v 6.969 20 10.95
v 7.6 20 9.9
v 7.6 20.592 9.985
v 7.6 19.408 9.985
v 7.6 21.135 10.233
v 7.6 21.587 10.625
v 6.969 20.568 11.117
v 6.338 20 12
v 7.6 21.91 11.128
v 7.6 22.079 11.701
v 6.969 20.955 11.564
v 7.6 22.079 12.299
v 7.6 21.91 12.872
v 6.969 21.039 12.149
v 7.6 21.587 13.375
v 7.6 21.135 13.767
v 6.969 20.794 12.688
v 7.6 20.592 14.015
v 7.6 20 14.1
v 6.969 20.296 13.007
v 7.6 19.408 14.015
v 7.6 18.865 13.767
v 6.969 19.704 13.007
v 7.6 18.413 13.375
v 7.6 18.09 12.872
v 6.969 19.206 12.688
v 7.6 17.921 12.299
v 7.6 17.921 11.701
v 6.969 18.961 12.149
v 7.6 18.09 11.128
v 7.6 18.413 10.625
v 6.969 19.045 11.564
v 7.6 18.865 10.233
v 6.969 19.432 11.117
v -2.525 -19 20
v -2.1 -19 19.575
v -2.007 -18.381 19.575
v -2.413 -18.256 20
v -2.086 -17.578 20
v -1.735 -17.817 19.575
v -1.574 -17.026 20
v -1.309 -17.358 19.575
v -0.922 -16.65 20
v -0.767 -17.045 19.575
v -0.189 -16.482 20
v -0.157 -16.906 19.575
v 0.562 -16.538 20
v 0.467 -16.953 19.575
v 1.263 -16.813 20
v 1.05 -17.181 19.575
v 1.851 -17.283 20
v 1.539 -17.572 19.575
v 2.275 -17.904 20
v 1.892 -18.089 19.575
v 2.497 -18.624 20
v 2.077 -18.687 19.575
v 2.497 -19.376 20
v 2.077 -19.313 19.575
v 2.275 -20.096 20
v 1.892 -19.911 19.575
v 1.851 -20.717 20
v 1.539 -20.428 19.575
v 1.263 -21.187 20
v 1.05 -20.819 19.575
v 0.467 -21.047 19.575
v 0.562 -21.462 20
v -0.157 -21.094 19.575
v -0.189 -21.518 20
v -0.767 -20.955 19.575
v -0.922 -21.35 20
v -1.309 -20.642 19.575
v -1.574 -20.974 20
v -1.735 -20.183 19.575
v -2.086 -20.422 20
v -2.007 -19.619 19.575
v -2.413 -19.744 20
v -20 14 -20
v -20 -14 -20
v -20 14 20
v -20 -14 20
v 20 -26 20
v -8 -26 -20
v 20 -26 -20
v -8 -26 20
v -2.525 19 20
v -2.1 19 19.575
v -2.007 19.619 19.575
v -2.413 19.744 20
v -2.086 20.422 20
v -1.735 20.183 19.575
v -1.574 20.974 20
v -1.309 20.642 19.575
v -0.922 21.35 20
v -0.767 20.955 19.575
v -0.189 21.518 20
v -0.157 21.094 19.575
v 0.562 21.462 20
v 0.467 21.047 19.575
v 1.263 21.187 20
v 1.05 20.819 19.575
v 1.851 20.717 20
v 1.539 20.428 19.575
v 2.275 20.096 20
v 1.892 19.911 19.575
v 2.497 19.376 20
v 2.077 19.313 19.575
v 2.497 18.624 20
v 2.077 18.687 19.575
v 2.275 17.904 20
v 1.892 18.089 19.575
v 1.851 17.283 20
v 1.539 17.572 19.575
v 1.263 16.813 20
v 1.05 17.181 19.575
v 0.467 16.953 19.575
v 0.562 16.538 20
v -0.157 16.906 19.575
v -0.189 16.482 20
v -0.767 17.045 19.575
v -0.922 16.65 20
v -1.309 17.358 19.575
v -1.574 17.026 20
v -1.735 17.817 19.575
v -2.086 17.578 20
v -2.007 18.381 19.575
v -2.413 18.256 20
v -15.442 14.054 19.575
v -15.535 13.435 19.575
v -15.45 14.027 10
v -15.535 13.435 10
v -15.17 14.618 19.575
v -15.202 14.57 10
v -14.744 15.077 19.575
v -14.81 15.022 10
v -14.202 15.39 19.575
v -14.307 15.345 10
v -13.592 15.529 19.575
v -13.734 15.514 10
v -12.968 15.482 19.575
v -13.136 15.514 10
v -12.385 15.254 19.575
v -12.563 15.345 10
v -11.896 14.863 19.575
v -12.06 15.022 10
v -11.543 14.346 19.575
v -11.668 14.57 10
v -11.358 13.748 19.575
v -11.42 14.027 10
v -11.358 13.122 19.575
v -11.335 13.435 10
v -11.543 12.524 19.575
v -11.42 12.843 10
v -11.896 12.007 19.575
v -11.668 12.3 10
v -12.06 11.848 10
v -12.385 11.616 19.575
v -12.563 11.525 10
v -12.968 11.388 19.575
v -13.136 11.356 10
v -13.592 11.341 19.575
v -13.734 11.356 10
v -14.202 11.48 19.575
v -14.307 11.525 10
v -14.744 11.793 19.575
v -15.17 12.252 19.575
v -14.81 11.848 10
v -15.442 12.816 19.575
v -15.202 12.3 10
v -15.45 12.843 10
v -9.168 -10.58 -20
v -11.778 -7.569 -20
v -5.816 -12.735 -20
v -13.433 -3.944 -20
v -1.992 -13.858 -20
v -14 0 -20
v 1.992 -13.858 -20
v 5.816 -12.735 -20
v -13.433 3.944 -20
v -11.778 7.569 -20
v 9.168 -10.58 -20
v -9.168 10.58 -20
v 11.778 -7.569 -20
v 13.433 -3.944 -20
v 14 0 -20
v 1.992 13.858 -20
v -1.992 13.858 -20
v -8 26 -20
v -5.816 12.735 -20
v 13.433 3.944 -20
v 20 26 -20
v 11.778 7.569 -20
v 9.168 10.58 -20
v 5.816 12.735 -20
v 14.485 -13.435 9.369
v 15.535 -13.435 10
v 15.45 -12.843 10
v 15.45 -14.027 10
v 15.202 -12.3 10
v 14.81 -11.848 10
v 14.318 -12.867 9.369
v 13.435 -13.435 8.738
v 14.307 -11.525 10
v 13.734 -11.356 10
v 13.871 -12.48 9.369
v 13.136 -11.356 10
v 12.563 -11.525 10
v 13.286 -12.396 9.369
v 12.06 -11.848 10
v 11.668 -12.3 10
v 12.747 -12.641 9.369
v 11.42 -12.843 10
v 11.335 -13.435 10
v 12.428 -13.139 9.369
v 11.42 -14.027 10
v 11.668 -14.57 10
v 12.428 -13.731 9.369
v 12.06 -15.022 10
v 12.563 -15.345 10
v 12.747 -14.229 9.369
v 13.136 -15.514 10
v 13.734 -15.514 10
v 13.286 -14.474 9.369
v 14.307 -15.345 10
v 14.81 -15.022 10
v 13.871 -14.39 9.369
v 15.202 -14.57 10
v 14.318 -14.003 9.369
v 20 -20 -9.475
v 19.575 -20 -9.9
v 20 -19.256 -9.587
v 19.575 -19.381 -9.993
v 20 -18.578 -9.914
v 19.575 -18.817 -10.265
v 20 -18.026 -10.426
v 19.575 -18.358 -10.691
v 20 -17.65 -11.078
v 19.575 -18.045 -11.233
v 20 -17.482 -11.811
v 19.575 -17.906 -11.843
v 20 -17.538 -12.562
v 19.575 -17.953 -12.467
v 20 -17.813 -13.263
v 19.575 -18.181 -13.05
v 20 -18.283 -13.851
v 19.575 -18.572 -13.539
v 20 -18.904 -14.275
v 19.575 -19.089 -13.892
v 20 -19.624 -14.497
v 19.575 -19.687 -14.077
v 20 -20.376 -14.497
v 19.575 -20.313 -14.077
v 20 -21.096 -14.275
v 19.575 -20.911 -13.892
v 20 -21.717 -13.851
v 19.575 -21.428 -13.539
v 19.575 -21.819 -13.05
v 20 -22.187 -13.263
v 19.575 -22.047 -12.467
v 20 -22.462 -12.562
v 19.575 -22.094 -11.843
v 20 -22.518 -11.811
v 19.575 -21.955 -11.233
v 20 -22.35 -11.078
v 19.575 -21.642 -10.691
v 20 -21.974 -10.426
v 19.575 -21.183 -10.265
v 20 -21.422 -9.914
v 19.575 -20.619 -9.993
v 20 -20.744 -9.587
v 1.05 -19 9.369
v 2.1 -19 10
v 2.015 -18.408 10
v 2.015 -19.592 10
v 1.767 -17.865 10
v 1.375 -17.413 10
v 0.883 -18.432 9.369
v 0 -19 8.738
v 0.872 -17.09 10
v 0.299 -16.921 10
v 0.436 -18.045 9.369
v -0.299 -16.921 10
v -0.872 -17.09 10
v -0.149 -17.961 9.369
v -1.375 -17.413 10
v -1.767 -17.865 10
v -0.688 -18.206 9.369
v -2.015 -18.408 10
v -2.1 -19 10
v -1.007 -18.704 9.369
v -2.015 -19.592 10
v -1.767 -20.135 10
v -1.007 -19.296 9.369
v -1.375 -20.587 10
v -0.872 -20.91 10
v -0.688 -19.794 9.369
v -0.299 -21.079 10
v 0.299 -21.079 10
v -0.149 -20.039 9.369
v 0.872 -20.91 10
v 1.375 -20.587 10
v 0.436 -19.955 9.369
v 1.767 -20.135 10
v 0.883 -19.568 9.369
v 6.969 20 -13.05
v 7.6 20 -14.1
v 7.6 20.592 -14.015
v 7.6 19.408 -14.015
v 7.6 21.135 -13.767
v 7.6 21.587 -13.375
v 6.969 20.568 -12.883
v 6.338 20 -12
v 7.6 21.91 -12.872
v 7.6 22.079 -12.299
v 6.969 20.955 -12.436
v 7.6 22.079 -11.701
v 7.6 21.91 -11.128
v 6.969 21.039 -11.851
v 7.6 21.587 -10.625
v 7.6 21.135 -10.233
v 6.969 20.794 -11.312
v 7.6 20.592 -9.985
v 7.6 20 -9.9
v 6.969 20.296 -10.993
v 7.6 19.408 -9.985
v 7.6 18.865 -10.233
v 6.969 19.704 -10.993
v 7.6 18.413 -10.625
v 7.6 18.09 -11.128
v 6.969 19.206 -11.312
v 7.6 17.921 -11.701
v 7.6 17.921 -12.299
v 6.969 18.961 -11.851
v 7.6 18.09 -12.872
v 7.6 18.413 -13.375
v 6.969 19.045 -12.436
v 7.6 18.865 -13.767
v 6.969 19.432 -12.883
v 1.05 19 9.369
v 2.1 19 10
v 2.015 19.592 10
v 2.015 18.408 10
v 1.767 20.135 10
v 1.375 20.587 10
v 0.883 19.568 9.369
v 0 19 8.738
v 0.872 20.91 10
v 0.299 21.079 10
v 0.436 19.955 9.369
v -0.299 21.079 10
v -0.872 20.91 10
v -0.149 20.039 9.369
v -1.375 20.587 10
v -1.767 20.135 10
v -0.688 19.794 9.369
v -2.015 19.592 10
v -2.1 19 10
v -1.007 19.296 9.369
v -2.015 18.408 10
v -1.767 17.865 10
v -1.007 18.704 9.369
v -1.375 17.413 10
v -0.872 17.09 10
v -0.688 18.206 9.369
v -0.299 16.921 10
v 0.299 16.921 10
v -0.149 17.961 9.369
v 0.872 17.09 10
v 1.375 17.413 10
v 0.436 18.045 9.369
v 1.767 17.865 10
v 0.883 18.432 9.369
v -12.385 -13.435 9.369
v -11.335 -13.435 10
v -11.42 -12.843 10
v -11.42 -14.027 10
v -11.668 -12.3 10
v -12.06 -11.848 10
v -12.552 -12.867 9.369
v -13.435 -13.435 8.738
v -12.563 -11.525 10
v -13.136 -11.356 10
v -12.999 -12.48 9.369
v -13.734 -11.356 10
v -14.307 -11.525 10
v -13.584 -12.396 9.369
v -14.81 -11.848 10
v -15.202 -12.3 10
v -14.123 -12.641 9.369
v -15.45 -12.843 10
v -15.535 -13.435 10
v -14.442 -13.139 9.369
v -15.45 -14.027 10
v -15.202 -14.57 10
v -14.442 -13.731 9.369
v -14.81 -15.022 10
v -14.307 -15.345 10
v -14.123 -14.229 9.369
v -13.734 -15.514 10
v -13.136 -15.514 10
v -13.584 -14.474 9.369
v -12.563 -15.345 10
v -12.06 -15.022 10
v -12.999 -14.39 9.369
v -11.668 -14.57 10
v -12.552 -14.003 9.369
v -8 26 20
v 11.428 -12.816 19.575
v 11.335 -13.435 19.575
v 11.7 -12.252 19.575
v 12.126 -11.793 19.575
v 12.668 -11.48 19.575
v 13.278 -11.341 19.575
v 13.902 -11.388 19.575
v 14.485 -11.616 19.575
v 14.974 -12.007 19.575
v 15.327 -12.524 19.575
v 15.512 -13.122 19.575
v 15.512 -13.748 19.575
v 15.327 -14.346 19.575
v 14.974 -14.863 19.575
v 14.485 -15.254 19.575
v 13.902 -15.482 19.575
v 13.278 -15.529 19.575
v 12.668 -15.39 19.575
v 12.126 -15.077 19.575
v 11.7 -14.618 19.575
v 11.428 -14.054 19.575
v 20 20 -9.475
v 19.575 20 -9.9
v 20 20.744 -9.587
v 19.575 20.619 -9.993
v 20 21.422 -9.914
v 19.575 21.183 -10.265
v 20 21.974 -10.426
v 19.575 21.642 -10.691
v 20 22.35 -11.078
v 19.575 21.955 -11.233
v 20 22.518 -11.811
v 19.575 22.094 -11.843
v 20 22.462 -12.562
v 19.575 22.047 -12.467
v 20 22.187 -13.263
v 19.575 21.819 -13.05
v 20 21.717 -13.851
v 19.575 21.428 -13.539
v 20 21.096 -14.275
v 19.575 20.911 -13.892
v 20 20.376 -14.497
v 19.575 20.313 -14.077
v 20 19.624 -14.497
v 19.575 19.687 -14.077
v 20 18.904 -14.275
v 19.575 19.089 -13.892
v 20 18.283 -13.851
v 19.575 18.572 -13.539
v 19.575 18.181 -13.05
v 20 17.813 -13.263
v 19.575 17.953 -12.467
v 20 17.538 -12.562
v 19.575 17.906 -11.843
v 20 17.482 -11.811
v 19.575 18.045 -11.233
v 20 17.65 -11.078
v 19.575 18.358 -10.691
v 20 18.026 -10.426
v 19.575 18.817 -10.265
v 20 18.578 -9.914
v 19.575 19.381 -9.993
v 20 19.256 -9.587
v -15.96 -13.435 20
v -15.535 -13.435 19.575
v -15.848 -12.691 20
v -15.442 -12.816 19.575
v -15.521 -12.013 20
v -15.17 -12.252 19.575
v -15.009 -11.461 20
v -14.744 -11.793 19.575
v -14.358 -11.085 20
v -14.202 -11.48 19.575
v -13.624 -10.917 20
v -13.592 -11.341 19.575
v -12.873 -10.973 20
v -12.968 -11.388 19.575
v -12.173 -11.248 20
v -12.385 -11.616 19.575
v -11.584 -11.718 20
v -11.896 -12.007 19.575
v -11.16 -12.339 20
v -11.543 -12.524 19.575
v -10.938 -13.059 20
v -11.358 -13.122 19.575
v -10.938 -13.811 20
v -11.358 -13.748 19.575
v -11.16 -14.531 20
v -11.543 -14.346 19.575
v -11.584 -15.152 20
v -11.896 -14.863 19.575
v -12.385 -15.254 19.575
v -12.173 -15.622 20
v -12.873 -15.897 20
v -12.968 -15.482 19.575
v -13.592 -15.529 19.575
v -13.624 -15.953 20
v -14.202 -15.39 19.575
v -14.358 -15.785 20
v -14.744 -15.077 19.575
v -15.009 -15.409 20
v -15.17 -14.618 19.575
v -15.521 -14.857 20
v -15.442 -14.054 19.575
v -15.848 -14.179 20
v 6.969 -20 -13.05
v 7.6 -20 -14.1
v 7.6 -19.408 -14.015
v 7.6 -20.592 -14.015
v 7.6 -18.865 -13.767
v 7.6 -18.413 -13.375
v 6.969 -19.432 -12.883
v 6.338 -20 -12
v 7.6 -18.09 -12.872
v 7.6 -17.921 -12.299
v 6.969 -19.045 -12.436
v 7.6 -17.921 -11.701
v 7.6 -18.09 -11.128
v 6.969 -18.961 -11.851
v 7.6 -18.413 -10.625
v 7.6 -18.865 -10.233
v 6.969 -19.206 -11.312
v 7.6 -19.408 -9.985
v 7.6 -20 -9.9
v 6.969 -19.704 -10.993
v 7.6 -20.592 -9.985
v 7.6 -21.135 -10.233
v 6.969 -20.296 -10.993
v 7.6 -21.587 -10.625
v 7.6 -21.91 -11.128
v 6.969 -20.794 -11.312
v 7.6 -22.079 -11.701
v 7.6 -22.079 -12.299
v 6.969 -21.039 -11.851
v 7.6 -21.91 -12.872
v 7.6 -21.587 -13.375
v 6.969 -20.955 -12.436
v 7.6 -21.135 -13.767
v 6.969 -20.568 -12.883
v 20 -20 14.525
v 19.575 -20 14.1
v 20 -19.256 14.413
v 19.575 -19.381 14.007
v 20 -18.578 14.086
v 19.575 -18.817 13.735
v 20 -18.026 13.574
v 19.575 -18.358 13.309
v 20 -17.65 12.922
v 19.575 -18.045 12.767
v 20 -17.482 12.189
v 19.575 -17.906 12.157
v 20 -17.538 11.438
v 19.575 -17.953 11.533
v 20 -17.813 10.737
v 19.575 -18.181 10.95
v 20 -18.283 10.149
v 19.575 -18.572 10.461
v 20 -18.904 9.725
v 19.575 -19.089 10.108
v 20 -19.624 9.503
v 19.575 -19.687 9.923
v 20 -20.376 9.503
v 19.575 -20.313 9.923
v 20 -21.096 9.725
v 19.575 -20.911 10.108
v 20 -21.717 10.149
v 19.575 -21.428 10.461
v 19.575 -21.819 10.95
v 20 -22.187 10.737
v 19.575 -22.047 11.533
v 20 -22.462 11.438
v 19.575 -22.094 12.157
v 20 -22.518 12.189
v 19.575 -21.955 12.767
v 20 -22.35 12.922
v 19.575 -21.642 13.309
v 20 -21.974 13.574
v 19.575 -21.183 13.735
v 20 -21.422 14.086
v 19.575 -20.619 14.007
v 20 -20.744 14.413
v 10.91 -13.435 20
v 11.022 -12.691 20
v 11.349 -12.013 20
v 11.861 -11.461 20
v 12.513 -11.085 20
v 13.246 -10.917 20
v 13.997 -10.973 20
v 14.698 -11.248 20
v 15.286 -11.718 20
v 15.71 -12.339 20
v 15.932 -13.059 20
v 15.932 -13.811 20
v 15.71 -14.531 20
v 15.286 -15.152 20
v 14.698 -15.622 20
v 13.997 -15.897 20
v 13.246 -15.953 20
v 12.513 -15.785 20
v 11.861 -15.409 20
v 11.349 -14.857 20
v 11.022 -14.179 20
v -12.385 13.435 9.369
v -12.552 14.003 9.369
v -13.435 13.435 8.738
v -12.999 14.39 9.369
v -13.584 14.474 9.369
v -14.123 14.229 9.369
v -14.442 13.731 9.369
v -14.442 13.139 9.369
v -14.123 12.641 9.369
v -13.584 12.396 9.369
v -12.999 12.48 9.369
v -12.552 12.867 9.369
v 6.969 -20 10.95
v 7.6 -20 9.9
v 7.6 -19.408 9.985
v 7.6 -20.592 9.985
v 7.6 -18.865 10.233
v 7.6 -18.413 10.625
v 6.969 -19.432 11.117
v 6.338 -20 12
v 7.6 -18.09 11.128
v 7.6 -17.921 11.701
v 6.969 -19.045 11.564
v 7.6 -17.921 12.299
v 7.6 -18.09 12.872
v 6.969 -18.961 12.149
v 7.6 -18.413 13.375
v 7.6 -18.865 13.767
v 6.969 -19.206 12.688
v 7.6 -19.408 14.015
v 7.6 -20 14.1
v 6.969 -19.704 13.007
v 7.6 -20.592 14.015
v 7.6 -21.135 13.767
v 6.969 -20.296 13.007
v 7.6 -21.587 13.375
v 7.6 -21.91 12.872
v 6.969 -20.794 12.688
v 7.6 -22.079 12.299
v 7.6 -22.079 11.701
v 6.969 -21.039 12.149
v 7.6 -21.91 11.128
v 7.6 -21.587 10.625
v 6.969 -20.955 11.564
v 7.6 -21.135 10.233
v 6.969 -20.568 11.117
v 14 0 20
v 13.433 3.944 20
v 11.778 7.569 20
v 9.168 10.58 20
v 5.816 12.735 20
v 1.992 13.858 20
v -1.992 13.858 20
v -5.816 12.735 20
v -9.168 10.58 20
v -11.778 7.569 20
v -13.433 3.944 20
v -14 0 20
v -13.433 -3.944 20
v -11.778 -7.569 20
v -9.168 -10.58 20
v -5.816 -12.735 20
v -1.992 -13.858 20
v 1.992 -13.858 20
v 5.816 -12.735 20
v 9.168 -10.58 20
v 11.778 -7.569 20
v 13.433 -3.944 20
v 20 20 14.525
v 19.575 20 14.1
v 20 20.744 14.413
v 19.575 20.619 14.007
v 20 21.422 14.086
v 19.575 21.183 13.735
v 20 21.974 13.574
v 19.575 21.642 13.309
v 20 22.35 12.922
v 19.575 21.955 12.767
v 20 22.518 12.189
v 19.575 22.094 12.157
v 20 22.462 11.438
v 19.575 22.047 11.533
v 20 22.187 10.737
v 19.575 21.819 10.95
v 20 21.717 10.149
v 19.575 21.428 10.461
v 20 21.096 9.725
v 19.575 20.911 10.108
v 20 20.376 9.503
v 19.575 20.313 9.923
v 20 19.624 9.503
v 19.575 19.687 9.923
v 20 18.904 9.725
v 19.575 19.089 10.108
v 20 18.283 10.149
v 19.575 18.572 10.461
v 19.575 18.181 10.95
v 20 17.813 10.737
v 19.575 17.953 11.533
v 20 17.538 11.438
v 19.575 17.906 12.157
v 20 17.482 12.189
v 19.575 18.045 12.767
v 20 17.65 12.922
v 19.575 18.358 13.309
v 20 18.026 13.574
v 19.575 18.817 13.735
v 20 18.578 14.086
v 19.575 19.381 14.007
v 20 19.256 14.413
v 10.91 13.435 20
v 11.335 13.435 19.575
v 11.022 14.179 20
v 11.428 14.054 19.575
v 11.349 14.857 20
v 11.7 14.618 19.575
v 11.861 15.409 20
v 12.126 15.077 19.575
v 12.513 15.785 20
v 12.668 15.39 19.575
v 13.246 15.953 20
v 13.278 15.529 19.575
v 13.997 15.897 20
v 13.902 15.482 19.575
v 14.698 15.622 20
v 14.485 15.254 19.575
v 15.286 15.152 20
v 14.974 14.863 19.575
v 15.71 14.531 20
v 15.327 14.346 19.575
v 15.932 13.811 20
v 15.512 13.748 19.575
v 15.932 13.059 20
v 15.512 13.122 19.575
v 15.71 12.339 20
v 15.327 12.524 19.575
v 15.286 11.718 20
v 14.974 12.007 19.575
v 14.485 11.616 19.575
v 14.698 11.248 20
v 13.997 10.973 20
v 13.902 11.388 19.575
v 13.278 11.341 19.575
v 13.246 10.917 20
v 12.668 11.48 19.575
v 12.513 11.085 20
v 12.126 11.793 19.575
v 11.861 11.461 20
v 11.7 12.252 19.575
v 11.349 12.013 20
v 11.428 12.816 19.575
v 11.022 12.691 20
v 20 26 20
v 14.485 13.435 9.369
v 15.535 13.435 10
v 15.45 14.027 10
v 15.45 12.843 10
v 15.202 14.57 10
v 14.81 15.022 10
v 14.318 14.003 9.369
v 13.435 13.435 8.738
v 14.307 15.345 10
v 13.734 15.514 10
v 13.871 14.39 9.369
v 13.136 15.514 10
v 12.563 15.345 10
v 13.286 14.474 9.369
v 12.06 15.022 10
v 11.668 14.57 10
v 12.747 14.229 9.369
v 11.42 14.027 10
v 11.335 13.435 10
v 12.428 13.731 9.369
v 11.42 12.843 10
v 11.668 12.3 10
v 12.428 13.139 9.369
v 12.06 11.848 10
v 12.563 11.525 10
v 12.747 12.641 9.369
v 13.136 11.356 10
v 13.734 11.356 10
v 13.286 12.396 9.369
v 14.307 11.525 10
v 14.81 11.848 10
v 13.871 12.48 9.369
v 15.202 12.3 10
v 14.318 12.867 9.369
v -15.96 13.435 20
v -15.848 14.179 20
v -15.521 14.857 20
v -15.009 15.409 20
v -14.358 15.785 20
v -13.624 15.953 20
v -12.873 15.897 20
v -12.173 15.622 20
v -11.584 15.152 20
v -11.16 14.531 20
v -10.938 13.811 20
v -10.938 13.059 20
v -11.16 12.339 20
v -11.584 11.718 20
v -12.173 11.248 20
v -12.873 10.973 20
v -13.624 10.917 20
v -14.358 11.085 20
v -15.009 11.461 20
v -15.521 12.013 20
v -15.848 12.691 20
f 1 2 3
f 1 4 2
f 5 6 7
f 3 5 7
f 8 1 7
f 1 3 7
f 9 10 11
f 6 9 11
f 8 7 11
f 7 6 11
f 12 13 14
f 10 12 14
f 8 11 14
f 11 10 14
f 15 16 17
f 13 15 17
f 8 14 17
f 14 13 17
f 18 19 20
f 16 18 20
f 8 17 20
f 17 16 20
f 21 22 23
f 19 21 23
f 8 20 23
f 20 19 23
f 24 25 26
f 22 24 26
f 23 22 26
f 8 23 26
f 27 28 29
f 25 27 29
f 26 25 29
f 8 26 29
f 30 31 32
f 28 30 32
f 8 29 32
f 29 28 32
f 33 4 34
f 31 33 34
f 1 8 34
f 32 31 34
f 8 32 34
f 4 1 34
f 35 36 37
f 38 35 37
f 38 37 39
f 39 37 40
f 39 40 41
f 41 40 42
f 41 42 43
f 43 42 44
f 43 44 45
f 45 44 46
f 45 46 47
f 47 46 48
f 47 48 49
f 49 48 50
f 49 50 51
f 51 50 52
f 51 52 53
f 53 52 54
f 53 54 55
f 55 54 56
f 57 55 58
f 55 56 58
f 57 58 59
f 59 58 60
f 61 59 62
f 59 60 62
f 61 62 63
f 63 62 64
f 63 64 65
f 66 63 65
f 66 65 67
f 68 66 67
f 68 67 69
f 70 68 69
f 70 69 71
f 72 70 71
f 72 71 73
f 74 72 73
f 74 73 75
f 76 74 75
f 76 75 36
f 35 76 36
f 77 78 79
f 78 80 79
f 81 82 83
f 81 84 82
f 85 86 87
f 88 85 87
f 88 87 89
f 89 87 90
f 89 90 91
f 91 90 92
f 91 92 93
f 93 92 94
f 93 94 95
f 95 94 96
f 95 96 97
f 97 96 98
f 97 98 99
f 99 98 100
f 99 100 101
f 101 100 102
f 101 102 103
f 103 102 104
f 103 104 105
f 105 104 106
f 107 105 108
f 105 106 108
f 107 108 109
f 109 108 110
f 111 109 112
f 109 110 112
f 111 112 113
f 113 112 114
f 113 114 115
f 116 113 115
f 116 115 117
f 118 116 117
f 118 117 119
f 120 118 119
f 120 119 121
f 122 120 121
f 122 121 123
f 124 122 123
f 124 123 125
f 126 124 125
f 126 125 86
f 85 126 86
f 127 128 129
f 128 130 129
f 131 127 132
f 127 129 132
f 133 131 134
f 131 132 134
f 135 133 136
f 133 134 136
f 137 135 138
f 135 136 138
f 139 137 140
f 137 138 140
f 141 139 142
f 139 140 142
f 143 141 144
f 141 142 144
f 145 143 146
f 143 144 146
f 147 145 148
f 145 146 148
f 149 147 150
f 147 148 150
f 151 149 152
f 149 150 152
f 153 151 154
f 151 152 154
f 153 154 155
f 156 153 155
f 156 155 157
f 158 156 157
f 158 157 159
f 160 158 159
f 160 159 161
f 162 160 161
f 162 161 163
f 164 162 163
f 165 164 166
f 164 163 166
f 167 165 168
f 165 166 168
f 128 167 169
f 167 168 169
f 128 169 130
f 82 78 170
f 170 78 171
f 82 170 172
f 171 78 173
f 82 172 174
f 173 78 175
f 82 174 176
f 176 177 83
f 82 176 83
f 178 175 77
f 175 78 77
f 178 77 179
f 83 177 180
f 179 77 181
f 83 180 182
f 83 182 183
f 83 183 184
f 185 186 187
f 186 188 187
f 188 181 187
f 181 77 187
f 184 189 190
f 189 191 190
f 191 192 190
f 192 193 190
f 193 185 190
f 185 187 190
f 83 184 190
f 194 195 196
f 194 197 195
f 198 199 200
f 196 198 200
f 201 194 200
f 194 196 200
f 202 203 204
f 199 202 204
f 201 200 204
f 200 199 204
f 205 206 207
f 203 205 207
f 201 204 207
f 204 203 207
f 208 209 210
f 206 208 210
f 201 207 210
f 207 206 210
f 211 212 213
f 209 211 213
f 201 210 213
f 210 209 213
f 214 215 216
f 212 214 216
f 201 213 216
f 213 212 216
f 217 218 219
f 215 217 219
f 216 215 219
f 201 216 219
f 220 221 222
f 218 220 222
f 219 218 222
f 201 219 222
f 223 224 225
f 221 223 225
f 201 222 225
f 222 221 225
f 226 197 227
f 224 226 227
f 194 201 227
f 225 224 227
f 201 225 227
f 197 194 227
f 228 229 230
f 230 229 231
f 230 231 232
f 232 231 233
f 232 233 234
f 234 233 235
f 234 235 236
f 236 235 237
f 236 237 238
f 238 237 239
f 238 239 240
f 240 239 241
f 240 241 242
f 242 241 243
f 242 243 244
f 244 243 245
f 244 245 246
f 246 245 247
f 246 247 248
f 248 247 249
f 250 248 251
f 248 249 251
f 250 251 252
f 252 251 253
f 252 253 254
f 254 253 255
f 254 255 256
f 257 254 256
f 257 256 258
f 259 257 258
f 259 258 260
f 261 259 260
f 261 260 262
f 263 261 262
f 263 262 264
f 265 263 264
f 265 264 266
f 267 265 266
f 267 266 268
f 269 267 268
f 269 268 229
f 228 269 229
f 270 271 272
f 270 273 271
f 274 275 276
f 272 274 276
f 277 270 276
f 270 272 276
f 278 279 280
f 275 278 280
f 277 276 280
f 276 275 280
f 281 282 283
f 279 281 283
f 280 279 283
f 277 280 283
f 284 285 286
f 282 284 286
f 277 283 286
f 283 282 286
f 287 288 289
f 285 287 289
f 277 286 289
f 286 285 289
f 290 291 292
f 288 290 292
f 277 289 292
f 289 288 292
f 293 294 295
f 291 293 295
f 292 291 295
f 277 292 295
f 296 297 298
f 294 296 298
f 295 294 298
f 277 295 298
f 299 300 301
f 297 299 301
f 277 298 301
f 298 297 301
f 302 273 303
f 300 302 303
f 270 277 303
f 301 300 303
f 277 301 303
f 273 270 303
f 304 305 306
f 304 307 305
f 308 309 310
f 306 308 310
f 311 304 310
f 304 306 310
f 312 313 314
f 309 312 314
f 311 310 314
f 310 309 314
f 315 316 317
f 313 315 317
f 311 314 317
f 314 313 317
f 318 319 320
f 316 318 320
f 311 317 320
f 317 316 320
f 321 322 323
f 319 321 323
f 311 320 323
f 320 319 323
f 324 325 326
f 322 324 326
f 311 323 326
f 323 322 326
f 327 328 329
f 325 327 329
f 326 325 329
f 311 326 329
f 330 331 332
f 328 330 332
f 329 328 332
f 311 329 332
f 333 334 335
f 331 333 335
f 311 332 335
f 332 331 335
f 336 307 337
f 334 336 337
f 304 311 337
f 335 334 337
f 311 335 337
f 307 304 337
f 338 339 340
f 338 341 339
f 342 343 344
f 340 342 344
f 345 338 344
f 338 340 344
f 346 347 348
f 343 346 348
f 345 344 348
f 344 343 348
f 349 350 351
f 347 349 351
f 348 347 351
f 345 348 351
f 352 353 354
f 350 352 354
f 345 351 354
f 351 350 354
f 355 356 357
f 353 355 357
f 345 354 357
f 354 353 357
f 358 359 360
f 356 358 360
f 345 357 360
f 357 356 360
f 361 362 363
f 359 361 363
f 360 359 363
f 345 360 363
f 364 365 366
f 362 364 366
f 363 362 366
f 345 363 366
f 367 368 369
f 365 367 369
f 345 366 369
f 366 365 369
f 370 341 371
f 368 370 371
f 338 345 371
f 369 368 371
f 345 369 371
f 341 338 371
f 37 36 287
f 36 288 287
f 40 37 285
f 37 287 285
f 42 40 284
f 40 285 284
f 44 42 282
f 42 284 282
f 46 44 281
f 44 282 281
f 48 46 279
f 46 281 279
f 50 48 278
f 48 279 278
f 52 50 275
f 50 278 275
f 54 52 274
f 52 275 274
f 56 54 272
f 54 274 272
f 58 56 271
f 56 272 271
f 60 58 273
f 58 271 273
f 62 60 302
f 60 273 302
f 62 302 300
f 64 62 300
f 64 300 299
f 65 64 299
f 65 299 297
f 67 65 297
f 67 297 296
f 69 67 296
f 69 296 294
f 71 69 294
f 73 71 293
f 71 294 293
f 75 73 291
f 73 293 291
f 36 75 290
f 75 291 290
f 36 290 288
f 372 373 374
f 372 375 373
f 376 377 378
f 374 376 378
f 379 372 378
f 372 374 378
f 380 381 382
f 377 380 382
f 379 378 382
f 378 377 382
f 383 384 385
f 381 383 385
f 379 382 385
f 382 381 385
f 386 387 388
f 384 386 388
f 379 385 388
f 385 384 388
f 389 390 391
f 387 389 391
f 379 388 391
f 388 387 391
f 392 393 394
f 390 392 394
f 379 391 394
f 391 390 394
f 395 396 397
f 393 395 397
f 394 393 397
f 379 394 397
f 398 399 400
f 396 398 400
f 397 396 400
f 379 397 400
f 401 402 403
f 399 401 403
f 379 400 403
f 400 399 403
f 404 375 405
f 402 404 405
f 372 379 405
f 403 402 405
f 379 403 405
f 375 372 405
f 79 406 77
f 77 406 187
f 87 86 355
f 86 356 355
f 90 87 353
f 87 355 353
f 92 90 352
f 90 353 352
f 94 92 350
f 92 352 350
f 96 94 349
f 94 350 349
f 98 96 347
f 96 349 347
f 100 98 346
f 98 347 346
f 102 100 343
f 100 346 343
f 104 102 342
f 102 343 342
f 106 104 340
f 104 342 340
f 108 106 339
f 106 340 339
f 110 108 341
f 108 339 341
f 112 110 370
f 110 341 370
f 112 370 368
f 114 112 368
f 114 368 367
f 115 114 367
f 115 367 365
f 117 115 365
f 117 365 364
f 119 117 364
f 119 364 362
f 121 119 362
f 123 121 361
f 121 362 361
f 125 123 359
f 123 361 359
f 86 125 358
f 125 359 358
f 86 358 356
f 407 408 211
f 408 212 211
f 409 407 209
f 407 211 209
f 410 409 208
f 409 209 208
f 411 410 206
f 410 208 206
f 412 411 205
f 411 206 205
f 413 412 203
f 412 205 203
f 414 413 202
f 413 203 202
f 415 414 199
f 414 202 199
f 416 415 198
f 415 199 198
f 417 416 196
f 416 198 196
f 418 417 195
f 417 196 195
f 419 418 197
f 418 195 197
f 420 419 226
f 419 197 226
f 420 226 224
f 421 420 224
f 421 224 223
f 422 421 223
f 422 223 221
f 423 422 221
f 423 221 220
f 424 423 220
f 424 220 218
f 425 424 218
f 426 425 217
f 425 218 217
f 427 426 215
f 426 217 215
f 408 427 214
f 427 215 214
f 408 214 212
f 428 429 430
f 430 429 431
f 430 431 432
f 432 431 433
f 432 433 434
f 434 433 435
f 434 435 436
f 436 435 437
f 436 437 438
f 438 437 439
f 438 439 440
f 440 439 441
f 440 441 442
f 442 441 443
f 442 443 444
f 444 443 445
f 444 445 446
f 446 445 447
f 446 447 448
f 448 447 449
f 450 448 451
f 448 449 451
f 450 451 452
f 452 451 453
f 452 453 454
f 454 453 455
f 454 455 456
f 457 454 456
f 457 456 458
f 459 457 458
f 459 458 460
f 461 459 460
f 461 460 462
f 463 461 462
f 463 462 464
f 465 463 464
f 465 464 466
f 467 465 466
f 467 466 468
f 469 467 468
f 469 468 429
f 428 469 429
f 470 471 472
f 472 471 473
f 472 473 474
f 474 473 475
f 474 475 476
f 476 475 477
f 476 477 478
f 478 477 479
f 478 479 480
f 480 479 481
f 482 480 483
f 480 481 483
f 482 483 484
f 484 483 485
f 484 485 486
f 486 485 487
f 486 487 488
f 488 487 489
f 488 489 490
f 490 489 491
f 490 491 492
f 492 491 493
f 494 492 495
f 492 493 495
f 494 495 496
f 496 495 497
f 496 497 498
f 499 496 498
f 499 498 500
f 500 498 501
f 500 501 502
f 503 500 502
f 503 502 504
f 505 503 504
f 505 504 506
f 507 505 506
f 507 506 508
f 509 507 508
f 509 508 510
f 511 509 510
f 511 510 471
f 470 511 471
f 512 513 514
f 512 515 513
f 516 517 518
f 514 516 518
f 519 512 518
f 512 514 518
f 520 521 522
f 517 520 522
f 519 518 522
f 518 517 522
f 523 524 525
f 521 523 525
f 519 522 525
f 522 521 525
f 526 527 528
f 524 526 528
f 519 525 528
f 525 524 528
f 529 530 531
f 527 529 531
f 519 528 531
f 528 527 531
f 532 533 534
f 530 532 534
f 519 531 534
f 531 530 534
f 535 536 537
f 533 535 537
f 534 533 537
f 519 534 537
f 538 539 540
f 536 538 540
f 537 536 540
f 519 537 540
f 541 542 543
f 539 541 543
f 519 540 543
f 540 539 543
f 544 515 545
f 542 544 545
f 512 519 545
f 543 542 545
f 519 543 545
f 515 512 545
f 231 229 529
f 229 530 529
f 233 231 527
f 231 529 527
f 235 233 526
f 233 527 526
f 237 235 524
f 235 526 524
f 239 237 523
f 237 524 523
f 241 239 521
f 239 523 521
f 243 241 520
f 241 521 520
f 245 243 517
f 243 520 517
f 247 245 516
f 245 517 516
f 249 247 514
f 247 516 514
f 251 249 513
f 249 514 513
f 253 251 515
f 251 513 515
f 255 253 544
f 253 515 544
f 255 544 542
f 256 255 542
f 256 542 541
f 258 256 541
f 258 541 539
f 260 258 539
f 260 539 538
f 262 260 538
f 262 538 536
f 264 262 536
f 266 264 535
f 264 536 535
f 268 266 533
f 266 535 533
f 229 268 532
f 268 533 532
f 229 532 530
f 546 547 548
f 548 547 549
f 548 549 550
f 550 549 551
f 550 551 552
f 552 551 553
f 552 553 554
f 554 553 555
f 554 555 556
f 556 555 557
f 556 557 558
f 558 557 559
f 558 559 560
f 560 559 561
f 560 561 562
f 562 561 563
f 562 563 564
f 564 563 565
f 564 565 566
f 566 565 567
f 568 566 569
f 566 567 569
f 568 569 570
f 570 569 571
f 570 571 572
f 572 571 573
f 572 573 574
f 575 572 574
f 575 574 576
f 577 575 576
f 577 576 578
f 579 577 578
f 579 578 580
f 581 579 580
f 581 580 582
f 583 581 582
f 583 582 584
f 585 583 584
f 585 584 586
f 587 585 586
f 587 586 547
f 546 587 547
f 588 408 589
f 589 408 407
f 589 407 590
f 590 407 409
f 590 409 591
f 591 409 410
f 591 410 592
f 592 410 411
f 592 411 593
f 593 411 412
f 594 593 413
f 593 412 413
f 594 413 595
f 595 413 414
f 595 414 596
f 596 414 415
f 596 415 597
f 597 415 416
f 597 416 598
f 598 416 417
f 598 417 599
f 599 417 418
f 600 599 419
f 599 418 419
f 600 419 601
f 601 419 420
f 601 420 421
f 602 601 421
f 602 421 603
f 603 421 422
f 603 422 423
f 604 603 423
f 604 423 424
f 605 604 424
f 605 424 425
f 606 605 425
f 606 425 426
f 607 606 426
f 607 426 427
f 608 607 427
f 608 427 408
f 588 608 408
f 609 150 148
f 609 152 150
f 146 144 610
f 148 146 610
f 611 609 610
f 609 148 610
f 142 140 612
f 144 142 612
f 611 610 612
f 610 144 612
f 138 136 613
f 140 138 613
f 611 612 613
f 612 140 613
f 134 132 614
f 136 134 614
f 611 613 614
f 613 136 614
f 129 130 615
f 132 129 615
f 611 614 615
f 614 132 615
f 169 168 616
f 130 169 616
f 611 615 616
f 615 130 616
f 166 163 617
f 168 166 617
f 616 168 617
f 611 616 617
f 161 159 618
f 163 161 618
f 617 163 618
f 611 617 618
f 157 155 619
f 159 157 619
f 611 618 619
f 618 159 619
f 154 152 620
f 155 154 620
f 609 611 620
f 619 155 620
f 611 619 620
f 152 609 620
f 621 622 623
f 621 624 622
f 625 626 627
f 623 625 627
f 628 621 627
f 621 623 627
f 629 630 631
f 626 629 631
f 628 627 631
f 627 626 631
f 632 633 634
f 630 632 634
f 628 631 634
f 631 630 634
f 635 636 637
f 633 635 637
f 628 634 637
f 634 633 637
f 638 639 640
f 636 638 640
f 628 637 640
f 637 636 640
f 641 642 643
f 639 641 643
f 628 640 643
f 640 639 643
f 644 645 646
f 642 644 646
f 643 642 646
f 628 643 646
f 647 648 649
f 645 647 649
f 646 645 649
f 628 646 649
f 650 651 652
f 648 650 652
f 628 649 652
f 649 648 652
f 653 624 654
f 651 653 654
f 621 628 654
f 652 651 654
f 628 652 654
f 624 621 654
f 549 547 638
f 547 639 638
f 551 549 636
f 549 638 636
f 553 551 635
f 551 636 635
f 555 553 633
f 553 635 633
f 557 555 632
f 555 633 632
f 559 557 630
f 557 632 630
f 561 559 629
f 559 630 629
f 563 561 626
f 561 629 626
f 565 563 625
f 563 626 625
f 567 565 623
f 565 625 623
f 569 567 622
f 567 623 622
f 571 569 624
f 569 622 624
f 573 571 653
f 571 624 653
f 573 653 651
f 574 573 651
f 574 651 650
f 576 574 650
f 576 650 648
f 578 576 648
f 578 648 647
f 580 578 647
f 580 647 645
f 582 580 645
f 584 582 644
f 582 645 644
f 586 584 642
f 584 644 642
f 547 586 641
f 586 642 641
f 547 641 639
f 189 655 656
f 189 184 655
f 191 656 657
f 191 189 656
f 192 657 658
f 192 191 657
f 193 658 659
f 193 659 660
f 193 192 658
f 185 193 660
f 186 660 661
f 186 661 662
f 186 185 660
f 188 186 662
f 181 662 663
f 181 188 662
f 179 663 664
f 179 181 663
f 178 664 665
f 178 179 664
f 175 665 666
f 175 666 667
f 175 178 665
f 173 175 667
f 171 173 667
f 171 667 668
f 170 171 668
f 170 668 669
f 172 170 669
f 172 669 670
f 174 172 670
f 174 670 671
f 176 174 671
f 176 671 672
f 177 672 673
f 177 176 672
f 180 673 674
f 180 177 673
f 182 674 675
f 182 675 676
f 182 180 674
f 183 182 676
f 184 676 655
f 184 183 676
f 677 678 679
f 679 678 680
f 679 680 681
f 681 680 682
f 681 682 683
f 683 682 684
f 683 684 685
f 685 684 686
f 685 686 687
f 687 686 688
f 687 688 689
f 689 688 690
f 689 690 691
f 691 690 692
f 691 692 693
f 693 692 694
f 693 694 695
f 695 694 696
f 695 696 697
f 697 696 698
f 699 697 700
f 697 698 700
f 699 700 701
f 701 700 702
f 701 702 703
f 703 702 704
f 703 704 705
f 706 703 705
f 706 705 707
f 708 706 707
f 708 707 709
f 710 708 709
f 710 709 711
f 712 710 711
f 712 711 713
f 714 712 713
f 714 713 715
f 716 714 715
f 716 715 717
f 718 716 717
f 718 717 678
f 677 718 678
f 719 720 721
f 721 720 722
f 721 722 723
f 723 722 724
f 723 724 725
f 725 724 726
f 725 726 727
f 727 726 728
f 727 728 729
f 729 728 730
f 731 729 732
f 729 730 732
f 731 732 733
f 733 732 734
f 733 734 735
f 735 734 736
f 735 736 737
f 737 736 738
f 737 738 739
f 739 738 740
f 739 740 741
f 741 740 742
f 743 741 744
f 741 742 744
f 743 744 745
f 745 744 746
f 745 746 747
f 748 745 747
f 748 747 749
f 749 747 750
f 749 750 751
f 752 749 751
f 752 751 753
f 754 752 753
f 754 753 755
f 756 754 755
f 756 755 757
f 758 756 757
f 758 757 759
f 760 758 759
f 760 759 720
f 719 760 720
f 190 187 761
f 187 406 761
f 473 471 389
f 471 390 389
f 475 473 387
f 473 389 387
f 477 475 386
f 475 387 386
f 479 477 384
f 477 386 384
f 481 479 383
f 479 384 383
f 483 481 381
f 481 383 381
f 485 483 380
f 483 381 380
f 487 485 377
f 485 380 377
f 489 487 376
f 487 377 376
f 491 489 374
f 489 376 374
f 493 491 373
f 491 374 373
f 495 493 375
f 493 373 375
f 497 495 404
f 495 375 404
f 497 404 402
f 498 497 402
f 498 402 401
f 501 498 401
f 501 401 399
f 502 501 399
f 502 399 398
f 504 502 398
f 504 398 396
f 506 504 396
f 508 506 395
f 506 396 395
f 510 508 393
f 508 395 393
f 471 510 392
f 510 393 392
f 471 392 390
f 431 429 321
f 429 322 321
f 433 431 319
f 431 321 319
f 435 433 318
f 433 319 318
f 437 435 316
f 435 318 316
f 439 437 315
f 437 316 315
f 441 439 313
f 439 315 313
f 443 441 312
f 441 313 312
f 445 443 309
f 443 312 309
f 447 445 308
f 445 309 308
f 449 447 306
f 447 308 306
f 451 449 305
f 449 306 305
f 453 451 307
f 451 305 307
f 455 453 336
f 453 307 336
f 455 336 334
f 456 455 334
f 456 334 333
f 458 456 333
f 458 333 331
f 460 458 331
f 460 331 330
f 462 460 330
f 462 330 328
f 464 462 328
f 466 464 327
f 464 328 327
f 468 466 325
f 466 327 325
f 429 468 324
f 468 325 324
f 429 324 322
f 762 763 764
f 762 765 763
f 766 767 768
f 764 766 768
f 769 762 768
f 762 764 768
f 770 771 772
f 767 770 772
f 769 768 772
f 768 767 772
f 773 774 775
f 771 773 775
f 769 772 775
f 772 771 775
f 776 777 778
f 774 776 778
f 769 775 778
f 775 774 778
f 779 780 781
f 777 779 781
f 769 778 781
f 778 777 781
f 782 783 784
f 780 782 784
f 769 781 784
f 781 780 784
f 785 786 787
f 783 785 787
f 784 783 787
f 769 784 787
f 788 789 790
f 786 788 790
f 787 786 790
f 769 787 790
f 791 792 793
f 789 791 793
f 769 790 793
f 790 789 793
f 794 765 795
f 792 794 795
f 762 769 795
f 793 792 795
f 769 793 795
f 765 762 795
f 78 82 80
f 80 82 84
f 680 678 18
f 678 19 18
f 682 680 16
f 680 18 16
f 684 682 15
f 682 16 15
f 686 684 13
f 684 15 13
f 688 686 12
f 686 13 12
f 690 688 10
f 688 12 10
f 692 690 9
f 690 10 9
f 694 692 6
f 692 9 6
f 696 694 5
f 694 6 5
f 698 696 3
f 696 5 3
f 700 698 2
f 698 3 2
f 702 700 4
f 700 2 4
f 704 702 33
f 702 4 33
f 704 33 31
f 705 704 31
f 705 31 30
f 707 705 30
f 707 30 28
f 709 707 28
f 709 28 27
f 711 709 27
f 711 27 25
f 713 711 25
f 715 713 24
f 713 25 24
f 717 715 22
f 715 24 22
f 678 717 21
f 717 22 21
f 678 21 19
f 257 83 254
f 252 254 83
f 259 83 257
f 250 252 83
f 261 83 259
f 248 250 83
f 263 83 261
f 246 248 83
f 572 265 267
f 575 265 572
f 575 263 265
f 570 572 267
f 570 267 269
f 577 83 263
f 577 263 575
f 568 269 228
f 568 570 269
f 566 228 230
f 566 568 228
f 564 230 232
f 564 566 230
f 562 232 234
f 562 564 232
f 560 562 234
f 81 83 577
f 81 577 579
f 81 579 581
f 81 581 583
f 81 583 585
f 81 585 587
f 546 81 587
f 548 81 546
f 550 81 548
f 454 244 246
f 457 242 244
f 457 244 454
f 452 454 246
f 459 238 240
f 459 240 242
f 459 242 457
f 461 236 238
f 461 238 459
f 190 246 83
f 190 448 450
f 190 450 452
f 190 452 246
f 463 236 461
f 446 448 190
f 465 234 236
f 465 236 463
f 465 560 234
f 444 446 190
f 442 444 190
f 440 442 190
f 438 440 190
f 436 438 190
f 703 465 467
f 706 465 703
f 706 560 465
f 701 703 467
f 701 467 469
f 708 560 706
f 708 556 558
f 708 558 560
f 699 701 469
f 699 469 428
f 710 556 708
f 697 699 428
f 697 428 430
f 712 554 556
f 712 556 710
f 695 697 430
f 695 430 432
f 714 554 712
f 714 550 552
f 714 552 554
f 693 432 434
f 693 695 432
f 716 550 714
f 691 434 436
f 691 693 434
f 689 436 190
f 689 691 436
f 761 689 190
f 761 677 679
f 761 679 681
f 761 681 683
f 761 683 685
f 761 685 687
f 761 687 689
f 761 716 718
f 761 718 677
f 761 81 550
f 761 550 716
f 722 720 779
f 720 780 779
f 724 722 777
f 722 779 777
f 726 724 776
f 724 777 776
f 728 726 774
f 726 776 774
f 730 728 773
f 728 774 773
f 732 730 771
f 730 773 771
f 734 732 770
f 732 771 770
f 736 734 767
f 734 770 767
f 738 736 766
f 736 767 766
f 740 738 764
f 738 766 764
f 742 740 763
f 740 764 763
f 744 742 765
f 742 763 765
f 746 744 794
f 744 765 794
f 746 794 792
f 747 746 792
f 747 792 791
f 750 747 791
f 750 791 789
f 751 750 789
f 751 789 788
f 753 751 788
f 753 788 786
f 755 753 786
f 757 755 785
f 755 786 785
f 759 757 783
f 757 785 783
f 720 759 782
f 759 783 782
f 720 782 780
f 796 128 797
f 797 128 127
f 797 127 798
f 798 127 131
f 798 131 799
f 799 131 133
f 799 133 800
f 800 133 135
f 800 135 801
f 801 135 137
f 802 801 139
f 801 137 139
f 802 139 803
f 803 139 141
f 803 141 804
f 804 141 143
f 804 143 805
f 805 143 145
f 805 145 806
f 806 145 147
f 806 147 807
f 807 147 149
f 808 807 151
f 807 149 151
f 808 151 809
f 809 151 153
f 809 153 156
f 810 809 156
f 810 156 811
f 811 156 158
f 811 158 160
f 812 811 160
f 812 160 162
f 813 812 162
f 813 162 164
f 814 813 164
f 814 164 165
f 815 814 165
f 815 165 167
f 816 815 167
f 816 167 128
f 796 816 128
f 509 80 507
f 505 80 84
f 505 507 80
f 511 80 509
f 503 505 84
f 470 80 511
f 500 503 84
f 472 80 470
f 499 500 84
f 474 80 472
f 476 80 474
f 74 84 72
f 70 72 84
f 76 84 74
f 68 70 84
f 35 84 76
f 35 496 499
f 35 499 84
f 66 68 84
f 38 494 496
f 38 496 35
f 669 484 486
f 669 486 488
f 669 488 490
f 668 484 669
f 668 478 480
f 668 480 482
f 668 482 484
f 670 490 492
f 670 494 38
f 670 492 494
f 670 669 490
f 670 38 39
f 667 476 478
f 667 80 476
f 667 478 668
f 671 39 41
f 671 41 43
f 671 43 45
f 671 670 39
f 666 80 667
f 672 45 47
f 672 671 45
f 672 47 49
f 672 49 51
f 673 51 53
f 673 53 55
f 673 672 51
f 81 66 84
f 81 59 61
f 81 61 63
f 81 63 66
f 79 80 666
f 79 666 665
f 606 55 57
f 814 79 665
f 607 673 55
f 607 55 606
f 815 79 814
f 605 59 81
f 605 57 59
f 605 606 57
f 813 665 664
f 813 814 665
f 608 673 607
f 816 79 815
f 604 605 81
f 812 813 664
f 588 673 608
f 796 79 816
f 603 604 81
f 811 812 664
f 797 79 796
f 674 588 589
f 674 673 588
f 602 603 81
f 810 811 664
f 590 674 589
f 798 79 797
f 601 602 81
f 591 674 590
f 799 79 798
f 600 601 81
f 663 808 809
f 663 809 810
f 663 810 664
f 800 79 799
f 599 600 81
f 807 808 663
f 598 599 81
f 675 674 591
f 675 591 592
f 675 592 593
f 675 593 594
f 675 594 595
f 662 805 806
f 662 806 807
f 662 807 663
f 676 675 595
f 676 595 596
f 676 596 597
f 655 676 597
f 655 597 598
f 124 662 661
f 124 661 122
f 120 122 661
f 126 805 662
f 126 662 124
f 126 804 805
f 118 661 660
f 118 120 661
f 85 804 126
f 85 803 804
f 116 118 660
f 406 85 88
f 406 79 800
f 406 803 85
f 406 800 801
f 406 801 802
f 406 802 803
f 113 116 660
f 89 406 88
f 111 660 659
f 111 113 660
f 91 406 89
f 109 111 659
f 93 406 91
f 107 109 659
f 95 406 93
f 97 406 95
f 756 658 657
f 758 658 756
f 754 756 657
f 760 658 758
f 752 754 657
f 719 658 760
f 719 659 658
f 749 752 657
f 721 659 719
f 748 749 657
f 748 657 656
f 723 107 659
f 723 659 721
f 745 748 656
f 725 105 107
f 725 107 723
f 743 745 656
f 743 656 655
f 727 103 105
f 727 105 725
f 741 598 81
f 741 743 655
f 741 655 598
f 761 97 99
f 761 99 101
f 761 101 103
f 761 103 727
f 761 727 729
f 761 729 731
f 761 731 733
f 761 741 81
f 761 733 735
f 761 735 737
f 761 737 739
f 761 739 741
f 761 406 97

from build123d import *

# Parameters (mm, degrees)
SKETCH1_W                       = 40
SKETCH1_H                       = 52
SKETCH1_R                       = 14
BOSS_EXTRUDE1_DEPTH             = 20
M5X0_8_TAPPED_HOLE1_D           = 4.2
M5X0_8_TAPPED_HOLE1_DEPTH       = 10
M5X0_8_TAPPED_HOLE1_CSINK_D     = 5.05
M5X0_8_TAPPED_HOLE1_CSINK_ANGLE = 90
M5X0_8_TAPPED_HOLE1_TIP         = 1.2618073
CHAMFER1_SIZE                   = 12
M5X0_8_TAPPED_HOLE2_D           = 4.2
M5X0_8_TAPPED_HOLE2_DEPTH       = 12.4
M5X0_8_TAPPED_HOLE2_CSINK_D     = 5.05
M5X0_8_TAPPED_HOLE2_CSINK_ANGLE = 90
M5X0_8_TAPPED_HOLE2_TIP         = 1.2618073


with BuildPart() as part:
    # Sketch1 → Boss-Extrude1 (new, symmetric)
    with BuildSketch(Plane.XY):
        Rectangle(SKETCH1_W, SKETCH1_H)
        Circle(SKETCH1_R, mode=Mode.SUBTRACT)
    extrude(amount=BOSS_EXTRUDE1_DEPTH, both=True)

    # M5x0.8 Tapped Hole1
    with Locations(Plane.XY.offset(20)):
        with Locations((-13.435028843, 13.435028843), (0, 19), (13.435028843, 13.435028843), (13.435028843, -13.435028843), (0, -19), (-13.435028843, -13.435028843)):
            CounterSinkHole(M5X0_8_TAPPED_HOLE1_D / 2, M5X0_8_TAPPED_HOLE1_CSINK_D / 2, depth=M5X0_8_TAPPED_HOLE1_DEPTH, counter_sink_angle=M5X0_8_TAPPED_HOLE1_CSINK_ANGLE)
            with Locations((0, 0, -(M5X0_8_TAPPED_HOLE1_DEPTH + M5X0_8_TAPPED_HOLE1_TIP / 2))):  # 118° drill point
                Cone(0, M5X0_8_TAPPED_HOLE1_D / 2, M5X0_8_TAPPED_HOLE1_TIP, mode=Mode.SUBTRACT)

    # Chamfer1
    chamfer1_edges = [part.edges().sort_by_distance(p)[0] for p in [
        (-20, -26, 0),
        (-20, 26, 0),
    ]]
    chamfer(chamfer1_edges, length=CHAMFER1_SIZE)

    # M5x0.8 Tapped Hole2
    with Locations(Plane(origin=(20, 0, 0), x_dir=(0, 0, -1), z_dir=(1, 0, 0))):
        with Locations((-12, 20), (12, 20), (12, -20), (-12, -20)):
            CounterSinkHole(M5X0_8_TAPPED_HOLE2_D / 2, M5X0_8_TAPPED_HOLE2_CSINK_D / 2, depth=M5X0_8_TAPPED_HOLE2_DEPTH, counter_sink_angle=M5X0_8_TAPPED_HOLE2_CSINK_ANGLE)
            with Locations((0, 0, -(M5X0_8_TAPPED_HOLE2_DEPTH + M5X0_8_TAPPED_HOLE2_TIP / 2))):  # 118° drill point
                Cone(0, M5X0_8_TAPPED_HOLE2_D / 2, M5X0_8_TAPPED_HOLE2_TIP, mode=Mode.SUBTRACT)


solid = part.part
